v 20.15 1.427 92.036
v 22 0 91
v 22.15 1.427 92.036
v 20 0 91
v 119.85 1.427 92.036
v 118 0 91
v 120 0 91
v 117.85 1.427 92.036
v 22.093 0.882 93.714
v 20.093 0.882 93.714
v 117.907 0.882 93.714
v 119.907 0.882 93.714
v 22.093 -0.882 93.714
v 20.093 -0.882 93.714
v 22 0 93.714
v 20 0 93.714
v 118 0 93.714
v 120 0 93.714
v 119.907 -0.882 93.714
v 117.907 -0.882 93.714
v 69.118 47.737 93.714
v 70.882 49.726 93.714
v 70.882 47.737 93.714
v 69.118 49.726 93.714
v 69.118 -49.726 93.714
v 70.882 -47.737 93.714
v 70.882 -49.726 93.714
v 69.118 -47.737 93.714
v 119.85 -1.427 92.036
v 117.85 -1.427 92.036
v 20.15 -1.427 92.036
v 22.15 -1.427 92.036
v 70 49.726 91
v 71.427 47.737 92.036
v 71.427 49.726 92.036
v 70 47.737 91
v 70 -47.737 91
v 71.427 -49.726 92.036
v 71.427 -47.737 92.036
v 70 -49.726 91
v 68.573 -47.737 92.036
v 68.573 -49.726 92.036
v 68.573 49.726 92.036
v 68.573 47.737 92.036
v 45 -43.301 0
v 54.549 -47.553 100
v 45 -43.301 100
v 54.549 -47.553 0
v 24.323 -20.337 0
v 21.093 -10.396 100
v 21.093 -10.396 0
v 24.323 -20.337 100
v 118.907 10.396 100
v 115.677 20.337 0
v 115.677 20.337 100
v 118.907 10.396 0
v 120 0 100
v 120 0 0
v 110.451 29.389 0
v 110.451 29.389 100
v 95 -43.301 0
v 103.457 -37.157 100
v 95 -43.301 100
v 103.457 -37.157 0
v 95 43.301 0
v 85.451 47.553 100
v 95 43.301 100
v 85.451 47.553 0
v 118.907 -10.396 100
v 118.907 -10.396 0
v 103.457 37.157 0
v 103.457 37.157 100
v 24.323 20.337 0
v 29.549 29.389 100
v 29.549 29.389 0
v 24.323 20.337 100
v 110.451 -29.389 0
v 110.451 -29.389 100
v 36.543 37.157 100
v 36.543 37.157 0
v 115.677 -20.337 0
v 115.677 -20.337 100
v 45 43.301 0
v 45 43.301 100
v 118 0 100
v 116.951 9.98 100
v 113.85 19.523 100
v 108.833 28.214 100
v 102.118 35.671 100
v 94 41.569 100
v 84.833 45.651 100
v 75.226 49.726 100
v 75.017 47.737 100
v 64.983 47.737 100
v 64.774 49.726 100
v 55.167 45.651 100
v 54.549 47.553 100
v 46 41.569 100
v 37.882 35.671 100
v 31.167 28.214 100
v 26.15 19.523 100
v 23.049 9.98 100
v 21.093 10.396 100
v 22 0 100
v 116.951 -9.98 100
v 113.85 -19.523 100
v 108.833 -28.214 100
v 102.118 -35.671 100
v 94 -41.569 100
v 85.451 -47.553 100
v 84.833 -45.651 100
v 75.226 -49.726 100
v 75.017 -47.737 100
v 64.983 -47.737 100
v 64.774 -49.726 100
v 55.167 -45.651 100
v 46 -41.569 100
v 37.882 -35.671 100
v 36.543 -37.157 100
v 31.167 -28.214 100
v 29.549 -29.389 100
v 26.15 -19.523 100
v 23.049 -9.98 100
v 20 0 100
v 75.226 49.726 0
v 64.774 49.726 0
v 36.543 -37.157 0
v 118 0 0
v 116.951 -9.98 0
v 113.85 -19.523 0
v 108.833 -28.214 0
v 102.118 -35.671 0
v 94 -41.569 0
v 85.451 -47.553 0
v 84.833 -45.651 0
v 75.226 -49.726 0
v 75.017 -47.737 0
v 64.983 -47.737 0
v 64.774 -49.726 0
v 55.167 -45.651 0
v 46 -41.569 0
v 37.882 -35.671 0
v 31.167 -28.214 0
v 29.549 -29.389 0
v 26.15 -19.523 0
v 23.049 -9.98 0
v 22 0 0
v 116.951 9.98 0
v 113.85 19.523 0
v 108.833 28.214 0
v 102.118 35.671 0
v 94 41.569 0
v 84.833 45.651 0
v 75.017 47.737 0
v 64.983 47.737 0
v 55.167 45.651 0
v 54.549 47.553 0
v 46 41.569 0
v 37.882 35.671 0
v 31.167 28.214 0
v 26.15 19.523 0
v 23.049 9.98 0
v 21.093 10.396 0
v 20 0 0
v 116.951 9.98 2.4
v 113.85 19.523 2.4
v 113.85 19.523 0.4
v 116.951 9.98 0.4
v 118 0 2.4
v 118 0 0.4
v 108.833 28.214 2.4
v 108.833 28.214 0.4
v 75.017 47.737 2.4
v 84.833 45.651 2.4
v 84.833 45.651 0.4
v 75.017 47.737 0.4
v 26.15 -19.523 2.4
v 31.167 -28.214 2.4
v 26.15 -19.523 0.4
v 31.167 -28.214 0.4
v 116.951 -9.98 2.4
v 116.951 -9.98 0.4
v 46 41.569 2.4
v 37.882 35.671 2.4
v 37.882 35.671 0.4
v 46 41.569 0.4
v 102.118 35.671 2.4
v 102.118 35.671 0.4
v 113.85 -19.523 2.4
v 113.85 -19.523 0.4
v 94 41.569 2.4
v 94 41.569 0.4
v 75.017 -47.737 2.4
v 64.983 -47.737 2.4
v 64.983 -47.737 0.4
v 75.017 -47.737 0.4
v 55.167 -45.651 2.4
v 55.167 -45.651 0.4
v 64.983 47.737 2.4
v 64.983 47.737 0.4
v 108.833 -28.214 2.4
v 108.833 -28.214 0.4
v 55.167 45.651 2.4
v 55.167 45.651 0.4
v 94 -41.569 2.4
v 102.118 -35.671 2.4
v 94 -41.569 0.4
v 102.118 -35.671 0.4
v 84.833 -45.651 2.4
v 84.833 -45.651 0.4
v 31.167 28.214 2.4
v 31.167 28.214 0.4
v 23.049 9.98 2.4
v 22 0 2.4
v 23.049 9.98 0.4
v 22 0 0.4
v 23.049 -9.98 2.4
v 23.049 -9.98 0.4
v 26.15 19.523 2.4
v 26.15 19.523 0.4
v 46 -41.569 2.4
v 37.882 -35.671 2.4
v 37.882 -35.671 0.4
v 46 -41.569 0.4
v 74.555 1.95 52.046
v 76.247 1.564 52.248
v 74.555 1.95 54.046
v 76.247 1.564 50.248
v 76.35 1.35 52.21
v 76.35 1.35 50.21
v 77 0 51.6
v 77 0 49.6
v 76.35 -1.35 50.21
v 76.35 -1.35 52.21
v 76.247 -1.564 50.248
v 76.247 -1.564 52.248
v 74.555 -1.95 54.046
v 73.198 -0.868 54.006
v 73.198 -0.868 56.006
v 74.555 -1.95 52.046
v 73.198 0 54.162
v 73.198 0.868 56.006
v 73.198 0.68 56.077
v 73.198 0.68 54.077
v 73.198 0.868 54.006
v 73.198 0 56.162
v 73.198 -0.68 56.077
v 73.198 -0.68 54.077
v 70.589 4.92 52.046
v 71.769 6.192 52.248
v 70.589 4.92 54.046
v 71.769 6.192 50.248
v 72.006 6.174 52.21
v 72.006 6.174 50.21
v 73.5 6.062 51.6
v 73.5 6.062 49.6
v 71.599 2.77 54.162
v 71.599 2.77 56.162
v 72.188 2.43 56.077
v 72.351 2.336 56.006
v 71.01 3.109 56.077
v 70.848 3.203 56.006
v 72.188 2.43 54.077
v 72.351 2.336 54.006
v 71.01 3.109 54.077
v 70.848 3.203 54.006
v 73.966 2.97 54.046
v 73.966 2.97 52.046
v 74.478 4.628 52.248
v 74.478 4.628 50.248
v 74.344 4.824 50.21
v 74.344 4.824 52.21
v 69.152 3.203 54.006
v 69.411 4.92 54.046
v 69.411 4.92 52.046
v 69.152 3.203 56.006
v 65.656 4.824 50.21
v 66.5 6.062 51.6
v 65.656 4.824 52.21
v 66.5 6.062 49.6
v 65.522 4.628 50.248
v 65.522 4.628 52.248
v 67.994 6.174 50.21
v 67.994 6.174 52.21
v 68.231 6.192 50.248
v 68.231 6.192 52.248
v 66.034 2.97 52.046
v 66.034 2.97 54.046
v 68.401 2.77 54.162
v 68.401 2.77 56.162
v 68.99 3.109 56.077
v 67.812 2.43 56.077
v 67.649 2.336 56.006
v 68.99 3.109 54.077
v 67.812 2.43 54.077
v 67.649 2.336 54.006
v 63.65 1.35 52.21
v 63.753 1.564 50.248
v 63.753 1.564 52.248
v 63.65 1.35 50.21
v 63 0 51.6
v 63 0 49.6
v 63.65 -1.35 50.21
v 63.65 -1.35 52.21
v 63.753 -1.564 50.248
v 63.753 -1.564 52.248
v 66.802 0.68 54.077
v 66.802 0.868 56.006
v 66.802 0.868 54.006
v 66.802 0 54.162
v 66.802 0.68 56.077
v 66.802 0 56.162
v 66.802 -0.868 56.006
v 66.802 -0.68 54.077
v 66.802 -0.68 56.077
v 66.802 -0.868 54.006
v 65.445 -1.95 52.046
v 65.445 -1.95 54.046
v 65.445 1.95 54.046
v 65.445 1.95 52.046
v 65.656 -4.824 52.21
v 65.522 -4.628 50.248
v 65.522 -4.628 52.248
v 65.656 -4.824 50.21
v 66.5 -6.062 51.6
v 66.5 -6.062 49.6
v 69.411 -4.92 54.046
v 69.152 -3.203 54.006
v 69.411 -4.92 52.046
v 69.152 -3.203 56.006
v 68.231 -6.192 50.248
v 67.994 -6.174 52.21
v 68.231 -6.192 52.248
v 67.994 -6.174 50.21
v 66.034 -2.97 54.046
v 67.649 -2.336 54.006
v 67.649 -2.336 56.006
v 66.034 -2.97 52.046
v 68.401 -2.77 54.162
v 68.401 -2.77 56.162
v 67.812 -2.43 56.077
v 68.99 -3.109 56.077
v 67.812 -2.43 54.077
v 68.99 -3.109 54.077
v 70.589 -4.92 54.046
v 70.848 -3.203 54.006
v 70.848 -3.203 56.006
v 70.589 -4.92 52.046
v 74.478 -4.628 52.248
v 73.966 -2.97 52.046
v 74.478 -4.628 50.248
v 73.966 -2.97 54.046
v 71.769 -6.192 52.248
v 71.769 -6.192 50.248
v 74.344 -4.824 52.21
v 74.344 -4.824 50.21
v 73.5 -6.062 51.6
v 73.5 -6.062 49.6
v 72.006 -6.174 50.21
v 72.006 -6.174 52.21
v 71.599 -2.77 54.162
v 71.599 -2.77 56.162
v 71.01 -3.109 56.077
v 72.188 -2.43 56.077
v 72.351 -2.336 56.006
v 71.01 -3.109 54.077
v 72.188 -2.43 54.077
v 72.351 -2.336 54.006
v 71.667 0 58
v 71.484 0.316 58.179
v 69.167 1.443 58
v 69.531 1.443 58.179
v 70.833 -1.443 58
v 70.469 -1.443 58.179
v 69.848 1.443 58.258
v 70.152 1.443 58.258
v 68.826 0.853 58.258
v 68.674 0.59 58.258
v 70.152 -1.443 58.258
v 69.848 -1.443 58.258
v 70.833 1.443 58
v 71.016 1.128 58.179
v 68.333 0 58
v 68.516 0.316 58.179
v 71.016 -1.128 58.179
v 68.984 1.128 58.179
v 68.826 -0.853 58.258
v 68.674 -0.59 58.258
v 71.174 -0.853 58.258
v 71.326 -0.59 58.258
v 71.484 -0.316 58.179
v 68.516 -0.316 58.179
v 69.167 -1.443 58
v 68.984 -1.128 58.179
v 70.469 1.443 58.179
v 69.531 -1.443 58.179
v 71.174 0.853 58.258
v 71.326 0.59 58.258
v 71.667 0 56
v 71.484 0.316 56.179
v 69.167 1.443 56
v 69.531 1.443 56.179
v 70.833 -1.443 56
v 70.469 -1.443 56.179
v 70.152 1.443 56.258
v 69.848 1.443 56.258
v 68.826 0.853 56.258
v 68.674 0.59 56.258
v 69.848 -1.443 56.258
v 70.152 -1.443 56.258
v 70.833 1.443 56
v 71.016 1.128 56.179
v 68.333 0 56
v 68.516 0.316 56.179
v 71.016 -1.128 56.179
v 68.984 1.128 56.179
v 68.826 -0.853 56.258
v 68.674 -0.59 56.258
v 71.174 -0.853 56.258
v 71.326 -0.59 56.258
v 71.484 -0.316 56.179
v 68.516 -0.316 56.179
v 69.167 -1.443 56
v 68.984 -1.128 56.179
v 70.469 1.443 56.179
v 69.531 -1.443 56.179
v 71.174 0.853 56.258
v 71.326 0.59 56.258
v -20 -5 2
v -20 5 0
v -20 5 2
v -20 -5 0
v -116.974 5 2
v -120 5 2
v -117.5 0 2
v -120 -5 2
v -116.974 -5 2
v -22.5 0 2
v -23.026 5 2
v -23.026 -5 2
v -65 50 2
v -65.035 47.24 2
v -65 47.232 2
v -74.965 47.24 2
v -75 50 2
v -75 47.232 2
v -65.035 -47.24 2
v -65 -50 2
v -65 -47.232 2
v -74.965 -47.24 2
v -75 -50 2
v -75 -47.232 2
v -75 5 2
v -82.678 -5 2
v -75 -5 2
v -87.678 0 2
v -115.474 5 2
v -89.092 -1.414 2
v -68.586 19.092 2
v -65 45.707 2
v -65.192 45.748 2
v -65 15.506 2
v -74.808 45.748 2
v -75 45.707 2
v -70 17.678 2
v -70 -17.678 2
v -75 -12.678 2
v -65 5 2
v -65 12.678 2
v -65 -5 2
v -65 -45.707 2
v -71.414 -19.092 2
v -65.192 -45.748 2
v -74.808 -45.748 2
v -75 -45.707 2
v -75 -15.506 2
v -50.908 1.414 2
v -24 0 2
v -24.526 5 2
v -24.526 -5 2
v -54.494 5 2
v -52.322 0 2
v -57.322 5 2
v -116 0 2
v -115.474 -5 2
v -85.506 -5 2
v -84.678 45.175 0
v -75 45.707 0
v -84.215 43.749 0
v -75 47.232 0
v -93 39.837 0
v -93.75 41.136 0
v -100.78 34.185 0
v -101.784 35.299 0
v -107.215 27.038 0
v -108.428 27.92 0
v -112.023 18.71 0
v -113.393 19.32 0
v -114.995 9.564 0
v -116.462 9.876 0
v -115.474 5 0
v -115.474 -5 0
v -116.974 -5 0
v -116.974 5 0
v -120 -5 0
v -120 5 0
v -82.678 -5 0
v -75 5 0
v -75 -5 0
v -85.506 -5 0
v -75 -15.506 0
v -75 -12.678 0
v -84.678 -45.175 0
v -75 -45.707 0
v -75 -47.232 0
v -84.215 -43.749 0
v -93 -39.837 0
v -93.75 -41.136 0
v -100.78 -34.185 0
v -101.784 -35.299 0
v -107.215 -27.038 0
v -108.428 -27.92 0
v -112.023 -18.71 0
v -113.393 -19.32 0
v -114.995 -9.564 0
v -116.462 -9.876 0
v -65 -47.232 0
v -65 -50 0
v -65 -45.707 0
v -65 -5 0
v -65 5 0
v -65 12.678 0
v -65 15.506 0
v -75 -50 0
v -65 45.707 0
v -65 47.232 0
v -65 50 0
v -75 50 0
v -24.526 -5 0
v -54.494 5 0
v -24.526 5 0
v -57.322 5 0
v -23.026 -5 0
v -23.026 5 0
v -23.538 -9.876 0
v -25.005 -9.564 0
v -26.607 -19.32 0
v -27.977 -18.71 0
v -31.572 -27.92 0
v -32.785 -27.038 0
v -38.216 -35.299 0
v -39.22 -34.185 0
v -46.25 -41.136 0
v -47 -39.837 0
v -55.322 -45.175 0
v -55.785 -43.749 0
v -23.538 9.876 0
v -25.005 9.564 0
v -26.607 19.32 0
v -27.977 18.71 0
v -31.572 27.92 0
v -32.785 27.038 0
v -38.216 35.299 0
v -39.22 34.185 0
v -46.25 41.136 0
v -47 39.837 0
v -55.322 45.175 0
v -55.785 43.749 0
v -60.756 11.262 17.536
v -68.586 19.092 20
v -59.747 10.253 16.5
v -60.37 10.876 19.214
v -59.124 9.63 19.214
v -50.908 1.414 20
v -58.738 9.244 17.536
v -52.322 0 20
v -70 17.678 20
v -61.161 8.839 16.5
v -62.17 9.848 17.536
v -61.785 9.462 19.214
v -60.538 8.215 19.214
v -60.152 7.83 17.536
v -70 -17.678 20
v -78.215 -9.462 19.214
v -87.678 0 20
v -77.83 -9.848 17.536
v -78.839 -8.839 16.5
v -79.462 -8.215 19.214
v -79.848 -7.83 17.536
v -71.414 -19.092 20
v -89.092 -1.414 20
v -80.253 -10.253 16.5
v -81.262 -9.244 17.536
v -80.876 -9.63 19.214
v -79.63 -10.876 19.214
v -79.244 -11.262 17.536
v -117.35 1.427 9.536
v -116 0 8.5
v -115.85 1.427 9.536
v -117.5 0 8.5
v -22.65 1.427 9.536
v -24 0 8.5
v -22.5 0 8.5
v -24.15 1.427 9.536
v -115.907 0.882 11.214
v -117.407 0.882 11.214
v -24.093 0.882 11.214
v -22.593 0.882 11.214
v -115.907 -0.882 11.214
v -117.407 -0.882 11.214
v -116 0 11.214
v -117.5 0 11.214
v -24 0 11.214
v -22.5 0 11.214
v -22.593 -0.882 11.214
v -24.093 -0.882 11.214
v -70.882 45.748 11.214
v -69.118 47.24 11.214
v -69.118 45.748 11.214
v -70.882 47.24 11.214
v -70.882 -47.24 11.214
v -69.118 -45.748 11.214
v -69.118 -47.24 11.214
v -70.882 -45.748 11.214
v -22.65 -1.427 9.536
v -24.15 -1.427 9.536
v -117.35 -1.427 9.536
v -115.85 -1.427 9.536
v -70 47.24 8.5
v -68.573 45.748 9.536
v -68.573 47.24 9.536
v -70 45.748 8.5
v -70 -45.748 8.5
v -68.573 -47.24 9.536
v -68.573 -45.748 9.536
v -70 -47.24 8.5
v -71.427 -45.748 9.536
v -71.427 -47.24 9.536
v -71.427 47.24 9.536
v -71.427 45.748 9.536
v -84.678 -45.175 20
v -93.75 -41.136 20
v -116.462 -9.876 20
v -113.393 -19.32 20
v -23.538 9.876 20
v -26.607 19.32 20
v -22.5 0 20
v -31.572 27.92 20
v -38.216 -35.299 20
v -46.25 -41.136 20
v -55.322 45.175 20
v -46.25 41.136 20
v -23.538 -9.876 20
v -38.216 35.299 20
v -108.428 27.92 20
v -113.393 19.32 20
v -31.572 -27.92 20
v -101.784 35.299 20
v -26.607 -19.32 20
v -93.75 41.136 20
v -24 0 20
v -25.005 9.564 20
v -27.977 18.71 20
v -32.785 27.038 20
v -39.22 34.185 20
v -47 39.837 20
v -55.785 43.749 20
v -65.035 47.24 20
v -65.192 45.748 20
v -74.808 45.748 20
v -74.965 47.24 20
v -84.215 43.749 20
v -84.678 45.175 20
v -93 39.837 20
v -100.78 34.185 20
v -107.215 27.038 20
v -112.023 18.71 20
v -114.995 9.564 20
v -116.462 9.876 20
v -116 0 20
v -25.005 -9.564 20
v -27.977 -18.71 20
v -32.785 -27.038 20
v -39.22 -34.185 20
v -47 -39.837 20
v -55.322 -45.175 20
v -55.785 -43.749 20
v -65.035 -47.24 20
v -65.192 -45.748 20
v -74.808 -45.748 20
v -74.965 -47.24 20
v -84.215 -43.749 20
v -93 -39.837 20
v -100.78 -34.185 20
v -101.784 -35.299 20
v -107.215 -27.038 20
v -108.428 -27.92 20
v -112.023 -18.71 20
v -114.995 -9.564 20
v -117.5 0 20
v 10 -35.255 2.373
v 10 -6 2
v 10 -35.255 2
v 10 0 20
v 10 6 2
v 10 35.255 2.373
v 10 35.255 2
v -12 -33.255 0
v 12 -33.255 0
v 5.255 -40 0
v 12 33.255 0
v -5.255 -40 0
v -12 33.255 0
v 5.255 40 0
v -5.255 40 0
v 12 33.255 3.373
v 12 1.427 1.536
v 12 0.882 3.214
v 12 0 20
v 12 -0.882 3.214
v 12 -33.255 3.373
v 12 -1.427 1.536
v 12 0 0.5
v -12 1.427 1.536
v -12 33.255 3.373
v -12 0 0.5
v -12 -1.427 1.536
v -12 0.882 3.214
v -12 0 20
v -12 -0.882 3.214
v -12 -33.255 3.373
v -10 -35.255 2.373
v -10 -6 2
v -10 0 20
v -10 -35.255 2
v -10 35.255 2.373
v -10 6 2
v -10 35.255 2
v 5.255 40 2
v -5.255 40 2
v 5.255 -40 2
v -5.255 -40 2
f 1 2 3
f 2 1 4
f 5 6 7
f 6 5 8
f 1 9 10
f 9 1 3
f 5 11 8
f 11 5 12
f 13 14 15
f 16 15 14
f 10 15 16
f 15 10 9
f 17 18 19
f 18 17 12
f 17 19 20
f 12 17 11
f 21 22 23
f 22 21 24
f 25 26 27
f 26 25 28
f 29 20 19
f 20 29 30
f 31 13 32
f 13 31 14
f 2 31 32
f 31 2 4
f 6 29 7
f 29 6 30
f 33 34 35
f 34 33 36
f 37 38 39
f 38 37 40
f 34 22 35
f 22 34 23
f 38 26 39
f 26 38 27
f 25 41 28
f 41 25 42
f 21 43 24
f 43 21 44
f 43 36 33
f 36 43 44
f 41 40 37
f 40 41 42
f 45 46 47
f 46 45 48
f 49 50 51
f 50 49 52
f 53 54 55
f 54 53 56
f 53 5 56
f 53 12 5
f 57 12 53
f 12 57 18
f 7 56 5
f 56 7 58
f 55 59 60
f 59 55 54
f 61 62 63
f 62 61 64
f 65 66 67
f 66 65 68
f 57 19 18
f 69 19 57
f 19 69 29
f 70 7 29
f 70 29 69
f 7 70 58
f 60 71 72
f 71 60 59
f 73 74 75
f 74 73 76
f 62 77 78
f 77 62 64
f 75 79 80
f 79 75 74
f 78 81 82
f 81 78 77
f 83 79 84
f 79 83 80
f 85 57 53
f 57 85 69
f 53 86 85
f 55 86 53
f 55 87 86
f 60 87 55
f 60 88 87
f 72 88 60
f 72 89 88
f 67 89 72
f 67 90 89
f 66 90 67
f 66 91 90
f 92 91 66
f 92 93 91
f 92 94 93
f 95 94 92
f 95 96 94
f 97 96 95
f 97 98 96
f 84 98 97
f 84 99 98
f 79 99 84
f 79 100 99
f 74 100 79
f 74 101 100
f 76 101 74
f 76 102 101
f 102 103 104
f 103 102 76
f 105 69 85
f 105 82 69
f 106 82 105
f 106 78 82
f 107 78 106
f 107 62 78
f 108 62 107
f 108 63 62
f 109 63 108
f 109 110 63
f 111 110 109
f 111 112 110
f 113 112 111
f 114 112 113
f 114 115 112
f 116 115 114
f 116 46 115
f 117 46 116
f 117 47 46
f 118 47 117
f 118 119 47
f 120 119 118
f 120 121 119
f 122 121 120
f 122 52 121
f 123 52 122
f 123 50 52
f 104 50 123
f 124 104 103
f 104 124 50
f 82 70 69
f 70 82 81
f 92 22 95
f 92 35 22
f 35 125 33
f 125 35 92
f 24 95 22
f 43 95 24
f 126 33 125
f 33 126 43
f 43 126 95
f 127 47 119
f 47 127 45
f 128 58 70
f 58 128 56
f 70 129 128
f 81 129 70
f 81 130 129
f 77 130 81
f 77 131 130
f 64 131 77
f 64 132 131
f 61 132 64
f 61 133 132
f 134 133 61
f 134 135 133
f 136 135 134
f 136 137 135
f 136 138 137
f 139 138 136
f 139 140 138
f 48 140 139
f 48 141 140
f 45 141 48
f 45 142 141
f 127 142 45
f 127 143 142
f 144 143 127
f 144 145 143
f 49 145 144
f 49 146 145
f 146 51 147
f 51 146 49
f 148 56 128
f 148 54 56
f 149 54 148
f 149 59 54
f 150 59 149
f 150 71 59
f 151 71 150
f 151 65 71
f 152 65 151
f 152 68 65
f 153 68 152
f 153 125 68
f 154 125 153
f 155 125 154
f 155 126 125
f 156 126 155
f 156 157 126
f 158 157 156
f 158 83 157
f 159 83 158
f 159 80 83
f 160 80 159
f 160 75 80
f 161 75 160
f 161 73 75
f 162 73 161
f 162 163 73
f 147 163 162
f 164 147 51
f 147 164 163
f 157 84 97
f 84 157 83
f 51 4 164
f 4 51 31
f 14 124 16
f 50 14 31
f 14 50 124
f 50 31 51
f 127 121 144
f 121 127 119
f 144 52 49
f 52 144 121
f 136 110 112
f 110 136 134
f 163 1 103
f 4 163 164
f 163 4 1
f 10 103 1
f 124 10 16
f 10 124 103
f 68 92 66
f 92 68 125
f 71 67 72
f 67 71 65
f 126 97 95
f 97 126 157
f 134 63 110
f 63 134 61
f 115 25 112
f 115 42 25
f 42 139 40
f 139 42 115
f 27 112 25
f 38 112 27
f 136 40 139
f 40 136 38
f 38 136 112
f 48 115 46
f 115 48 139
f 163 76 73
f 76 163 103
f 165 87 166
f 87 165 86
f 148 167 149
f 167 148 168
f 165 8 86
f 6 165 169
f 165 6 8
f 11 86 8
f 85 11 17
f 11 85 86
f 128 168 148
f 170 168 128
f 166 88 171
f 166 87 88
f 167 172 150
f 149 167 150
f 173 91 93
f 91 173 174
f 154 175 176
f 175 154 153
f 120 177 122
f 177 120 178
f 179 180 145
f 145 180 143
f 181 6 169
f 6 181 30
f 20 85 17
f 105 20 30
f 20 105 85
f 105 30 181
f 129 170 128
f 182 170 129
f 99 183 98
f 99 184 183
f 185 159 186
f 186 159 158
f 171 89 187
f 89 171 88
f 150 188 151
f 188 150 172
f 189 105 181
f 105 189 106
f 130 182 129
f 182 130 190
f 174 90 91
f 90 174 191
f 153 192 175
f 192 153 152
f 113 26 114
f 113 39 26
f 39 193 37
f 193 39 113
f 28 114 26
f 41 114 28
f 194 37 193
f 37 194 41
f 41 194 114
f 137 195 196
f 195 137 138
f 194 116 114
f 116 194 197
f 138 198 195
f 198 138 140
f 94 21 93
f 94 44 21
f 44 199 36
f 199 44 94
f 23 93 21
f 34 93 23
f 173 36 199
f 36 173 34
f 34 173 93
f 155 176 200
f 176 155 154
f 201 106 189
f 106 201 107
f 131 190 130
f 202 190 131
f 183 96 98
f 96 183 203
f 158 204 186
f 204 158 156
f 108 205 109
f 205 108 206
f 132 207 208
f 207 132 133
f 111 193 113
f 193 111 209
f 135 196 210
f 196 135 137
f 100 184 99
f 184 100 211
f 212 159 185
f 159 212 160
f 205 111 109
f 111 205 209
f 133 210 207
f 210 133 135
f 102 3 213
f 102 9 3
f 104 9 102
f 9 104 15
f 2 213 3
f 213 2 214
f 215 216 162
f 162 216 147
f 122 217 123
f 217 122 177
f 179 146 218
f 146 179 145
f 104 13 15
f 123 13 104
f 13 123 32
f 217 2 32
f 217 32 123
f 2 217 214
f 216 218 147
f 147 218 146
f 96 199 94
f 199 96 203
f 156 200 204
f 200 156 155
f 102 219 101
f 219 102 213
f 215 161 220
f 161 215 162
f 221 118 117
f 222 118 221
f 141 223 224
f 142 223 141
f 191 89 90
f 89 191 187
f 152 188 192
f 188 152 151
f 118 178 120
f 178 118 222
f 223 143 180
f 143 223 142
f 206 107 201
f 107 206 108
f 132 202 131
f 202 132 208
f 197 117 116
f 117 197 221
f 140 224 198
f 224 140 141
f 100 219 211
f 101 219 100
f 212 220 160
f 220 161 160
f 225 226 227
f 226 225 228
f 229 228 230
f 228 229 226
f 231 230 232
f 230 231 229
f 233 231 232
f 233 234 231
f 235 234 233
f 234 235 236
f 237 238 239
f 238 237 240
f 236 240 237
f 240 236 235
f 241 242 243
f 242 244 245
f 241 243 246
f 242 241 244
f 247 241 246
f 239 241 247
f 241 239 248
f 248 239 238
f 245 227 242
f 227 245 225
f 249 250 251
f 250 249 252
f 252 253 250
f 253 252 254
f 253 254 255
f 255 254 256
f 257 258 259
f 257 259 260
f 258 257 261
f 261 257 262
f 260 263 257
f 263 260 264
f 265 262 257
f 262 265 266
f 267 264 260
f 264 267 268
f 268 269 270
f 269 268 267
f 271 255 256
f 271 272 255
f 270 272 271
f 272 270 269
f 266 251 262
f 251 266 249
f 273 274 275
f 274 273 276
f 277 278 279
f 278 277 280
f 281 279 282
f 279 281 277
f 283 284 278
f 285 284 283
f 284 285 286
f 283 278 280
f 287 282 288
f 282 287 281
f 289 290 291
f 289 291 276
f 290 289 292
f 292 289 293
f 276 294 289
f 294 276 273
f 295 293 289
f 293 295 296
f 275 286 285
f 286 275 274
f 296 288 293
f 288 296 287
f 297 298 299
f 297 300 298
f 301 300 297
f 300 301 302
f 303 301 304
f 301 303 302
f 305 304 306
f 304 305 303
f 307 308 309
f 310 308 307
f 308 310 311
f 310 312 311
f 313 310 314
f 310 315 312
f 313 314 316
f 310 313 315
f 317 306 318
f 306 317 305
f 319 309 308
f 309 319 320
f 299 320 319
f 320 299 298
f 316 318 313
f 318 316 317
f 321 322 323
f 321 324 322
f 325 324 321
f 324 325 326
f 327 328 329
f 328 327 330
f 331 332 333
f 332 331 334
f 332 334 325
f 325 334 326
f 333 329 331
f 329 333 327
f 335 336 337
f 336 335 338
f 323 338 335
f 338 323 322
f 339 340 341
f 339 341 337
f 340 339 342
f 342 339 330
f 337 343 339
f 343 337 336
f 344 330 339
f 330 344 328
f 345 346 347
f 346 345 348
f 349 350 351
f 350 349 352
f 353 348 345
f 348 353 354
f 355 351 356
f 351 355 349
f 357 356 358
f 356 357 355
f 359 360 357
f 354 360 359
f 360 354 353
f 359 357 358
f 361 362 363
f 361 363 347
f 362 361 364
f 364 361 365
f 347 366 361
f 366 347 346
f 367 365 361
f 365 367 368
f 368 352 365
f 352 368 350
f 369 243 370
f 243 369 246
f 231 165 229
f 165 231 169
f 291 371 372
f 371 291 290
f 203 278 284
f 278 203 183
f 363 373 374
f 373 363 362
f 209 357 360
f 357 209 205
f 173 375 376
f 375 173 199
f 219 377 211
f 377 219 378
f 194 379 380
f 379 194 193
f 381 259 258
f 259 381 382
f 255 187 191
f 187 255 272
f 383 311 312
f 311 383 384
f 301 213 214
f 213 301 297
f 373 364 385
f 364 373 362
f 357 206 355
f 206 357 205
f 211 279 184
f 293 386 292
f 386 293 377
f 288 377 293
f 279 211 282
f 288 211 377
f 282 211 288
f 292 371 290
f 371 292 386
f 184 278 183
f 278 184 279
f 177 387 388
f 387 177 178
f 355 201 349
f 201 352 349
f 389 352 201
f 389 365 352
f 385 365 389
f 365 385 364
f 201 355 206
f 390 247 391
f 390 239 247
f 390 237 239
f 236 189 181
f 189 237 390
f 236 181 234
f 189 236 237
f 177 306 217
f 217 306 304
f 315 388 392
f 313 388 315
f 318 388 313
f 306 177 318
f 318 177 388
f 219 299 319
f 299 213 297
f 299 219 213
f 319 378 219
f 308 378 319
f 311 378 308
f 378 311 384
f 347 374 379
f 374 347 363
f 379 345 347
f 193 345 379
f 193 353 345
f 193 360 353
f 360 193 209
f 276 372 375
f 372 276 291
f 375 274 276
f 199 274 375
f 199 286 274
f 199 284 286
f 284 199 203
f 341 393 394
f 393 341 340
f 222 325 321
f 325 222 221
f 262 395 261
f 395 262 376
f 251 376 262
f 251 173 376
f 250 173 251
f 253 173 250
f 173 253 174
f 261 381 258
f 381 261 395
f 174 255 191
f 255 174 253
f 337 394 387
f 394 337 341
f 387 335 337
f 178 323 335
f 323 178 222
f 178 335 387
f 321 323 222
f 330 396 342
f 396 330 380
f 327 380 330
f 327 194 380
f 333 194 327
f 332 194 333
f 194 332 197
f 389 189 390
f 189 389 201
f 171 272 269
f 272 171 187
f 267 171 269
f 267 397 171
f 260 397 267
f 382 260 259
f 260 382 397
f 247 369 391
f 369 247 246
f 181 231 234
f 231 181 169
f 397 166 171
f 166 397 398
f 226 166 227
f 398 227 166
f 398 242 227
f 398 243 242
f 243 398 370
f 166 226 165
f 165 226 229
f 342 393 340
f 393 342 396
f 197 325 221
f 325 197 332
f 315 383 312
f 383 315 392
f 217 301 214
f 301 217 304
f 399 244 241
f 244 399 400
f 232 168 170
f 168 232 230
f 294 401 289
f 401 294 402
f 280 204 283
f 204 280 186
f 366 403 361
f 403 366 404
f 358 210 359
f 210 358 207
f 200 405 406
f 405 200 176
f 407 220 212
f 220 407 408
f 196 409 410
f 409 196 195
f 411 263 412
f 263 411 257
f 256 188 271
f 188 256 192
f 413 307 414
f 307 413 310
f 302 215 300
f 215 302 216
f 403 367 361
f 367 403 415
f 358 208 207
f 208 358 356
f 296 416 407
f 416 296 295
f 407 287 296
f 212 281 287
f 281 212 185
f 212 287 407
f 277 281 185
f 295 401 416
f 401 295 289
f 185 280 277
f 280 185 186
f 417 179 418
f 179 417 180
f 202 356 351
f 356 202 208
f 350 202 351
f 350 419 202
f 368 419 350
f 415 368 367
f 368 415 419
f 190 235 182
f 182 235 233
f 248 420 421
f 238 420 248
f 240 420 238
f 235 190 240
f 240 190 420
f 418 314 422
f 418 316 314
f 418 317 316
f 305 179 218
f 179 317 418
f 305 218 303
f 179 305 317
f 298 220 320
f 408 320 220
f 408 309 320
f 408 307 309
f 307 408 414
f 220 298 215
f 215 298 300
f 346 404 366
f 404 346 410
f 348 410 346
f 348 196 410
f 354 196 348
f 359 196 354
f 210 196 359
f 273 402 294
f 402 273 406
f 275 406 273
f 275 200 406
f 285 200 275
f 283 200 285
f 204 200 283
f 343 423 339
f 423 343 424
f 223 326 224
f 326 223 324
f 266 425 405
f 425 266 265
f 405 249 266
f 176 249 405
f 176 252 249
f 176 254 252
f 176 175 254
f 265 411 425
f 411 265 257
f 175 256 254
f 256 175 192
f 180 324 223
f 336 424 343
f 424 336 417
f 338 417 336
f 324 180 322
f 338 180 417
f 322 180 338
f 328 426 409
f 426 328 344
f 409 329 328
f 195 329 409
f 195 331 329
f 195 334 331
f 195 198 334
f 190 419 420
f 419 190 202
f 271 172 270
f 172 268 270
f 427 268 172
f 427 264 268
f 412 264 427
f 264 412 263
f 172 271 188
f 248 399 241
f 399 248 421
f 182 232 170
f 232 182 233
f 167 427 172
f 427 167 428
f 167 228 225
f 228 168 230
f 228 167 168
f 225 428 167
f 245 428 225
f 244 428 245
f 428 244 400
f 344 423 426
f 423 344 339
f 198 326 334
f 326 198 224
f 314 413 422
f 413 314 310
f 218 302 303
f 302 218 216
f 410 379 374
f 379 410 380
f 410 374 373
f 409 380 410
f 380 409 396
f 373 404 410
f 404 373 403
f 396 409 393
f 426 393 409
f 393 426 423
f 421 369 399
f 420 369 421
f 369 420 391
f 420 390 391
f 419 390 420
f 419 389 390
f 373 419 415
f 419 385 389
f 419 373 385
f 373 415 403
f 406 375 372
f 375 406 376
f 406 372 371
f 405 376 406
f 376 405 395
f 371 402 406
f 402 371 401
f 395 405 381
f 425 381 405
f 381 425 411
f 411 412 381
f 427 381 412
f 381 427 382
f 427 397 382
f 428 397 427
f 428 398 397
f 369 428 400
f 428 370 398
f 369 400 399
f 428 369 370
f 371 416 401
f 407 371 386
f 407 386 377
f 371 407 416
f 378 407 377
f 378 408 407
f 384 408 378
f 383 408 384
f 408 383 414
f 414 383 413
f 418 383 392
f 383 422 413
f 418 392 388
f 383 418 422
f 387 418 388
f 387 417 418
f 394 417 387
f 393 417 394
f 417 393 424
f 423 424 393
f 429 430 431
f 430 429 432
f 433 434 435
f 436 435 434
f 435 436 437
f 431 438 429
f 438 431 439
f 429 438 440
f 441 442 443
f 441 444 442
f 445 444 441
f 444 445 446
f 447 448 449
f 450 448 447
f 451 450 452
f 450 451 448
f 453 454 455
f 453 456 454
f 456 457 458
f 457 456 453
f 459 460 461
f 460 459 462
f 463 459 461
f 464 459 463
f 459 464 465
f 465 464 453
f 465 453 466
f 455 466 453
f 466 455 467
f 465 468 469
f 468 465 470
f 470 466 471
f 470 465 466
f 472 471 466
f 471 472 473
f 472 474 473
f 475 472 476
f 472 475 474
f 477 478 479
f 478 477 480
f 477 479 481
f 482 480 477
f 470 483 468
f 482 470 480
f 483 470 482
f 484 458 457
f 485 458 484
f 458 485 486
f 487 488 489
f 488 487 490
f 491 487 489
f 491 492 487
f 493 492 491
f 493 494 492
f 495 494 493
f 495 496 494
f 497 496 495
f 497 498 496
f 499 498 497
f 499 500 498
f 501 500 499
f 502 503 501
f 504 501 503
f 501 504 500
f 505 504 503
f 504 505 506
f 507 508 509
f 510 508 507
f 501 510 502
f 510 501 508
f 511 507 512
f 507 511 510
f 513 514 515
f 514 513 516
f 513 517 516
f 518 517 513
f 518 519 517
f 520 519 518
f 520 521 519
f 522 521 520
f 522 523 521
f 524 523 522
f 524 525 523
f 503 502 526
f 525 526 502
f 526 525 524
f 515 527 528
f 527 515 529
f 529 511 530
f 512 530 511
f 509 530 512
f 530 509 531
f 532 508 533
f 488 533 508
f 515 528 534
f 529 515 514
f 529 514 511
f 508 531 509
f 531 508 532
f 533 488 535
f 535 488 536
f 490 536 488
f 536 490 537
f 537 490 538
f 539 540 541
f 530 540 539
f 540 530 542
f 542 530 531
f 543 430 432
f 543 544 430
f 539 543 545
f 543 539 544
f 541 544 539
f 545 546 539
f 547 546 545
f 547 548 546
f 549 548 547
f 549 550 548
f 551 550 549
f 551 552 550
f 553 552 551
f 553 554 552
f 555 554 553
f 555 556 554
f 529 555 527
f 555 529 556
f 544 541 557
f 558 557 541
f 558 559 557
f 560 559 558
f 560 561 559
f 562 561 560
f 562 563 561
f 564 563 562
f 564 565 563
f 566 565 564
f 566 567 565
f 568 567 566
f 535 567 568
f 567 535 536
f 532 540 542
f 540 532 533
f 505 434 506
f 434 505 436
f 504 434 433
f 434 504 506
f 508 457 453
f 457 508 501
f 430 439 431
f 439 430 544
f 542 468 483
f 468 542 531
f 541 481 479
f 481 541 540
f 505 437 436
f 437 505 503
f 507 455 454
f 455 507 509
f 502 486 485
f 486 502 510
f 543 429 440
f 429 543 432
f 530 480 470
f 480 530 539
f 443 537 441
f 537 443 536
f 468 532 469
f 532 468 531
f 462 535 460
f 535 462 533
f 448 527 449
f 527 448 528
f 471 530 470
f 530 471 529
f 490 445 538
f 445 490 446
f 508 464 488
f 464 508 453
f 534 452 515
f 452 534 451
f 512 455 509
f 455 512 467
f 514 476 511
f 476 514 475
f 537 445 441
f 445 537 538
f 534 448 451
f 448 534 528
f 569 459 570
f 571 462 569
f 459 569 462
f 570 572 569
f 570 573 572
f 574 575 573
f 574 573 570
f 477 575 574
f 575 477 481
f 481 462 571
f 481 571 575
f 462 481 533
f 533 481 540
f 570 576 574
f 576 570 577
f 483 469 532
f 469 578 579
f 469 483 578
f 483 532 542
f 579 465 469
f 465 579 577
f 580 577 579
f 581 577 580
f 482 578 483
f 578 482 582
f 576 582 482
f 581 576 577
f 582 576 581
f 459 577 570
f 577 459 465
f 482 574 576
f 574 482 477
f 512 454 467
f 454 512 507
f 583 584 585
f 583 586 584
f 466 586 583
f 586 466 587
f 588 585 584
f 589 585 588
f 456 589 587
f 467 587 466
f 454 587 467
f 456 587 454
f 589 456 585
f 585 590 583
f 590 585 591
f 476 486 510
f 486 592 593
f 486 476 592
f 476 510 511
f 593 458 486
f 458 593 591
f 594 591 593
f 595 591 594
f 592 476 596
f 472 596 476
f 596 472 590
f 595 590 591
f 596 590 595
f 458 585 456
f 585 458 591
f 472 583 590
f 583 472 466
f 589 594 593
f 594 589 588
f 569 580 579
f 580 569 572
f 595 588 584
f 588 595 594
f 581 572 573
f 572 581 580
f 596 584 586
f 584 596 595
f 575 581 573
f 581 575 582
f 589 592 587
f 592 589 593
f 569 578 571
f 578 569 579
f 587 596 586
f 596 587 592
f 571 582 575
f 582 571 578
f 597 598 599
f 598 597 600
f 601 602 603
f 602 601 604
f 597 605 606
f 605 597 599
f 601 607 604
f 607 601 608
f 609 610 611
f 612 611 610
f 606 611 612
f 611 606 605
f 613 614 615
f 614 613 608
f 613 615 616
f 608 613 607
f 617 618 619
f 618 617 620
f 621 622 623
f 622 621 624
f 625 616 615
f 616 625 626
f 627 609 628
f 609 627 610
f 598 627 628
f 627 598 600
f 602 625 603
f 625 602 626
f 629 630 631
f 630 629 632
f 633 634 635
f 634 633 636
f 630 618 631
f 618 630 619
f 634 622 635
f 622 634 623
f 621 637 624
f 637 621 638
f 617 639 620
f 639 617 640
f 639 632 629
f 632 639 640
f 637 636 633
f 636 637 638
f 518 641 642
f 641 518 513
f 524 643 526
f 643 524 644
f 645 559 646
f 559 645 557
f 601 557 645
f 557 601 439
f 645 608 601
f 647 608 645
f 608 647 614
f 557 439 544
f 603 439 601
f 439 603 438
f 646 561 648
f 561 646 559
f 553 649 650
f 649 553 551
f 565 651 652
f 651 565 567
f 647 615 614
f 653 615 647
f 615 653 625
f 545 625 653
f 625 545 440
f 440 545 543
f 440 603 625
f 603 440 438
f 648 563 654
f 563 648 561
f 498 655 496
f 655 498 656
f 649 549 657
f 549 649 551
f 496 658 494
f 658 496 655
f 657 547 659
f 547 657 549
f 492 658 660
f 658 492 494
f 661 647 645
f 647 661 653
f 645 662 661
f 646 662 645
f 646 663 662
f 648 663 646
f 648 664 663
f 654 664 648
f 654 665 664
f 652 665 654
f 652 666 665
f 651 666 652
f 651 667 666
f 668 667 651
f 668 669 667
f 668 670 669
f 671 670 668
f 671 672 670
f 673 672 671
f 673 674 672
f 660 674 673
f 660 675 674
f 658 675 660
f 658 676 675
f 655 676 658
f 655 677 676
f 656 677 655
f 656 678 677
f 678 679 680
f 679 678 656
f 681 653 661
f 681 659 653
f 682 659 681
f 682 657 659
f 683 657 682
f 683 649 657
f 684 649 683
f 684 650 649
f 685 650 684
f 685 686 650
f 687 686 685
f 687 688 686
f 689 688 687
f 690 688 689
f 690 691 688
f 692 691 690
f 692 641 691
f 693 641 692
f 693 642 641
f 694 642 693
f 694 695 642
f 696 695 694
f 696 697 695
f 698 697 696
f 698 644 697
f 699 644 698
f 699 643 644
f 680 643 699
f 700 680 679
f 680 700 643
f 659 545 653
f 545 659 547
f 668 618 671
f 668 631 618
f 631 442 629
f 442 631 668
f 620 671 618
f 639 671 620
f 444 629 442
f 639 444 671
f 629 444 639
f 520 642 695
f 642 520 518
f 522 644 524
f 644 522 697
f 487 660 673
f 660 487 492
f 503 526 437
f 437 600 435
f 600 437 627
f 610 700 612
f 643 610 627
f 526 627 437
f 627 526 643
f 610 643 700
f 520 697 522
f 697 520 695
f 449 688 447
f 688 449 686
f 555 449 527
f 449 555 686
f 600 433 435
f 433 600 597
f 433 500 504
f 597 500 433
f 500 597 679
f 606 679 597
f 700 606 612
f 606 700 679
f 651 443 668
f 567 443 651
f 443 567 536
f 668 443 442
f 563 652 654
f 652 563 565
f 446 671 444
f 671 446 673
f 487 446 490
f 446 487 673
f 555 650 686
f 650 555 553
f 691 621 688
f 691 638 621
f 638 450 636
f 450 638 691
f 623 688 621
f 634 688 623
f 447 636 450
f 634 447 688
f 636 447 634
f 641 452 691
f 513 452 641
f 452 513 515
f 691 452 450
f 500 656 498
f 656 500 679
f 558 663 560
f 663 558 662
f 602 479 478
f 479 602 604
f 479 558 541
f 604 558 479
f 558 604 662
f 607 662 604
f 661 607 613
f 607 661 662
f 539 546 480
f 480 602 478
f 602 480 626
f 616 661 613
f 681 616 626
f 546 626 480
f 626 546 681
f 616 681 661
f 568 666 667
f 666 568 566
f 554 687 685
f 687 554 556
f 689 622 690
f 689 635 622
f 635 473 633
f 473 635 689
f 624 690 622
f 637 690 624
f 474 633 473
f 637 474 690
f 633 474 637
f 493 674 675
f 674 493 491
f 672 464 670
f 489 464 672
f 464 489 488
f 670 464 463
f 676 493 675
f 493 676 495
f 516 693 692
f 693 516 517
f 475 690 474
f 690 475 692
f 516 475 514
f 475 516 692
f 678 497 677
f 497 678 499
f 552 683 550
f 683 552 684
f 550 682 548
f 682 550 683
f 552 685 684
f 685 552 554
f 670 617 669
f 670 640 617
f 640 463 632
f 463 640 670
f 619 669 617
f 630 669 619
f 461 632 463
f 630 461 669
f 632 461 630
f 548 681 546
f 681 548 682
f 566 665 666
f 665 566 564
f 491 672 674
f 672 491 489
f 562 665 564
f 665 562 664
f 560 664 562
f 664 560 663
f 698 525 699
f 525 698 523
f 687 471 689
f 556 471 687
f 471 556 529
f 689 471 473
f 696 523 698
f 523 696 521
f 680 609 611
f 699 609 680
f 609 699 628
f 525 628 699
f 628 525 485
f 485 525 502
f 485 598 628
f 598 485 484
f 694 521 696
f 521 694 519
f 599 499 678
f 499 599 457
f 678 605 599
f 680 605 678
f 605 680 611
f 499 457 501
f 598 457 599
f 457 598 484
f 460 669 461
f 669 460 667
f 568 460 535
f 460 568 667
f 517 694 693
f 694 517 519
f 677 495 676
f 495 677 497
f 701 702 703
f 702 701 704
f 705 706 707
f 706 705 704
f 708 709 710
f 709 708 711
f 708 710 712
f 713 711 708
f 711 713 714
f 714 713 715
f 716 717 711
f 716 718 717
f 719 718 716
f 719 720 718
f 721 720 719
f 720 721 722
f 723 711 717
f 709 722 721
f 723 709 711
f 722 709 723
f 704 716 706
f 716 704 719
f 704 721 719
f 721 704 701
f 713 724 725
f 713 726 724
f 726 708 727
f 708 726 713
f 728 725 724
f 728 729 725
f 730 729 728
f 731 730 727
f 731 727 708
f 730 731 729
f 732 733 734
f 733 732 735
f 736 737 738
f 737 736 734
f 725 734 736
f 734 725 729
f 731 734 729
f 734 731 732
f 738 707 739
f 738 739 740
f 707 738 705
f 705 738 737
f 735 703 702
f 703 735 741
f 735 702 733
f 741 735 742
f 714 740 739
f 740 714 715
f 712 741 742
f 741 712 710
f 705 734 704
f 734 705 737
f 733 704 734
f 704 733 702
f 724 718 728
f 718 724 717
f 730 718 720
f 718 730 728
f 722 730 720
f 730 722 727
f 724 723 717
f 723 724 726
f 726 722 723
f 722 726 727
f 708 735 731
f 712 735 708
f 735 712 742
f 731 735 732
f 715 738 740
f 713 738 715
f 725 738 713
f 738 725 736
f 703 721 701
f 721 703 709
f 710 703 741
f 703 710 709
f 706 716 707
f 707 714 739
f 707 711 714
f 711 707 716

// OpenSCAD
// All sizes are in mm
diameter = 100;
funnelheight = diameter*0.6;
assemblyheight = diameter;

clapperheight = 0.5*(assemblyheight-funnelheight);
clapperwidth = 0.6*(assemblyheight-funnelheight);
clapperlength = 0.8*diameter;
minordiameter = diameter/10;
thick = 2;
fudge = 0.5;

// set below to true for print layout, something else for assembly
printing = true;

square_centimeters =  diameter * diameter / 4 * 3.1415926 / 100;

echo( "Funnel surface = ",square_centimeters,"cm²");
echo( "Adding 100 milliliter of water is thus ", 1000 / square_centimeters, "mm precipitation");


if( printing )
{
	translate([.7*diameter,0,0])
		funnel();
	translate([-.7*diameter,0,0])
		base();
	clapper();
}
else
{
	color([1,1,0])
			base();
	color([1,0,1])
	difference() {
		translate([0,0,assemblyheight+thick])
		rotate([180,0,0])
			funnel();
		translate([thick, thick, 2*thick])
			cube([diameter, diameter, diameter]);
	}
	color([0,1,1])
	translate([0,0,clapperheight-2])
	rotate([30,0,45])
	translate([0,0,-2])
		clapper();
}

module funnel()
{
	union() {
		// Side walls
		difference() {
			cylinder(r=diameter/2, h=assemblyheight);
			translate([0,0,-thick])
			 	cylinder(r=diameter/2-thick, h=assemblyheight+2*thick);
			// mounting holes
			translate([0,0, assemblyheight-4*thick+fudge])
			{
				rotate([0,90,0])
						cylinder(r=1.5,h=diameter,center=true);
				rotate([90,90,0])
						cylinder(r=1.5,h=diameter,center=true);
			}
		}
		// Funnel
		difference() {
			cylinder(r1=diameter/2, r2=0, h=funnelheight);
			translate([0,0,-thick*1.0])
				cylinder(r1=diameter/2, r2=0, h=funnelheight);
			cylinder(r=minordiameter/6, h=assemblyheight);
			// Funnel holes
			for(i=[0:60:360])
				rotate([0,0,i])
				translate([minordiameter/2,0,0])
					cylinder(r=minordiameter/5, h=assemblyheight);
			
		}

	}
}


module base()
{	
	union() {
		// Cross base
		translate([0,0,thick/2])
		{
			cube([diameter,minordiameter,thick], center=true);
			cube([minordiameter,diameter,thick], center=true);
		}
		// Clapper mounting
		rotate([0,0,45])
		{
			difference()
			{	
				union() 
				{
					translate([clapperwidth/2+fudge,-diameter/8])
						cube([thick, diameter/4,clapperheight]);	
					translate([-clapperwidth/2-fudge-thick,-diameter/8])
						cube([thick, diameter/4,clapperheight]);
				}	
				translate([0,0,clapperheight-2])
					rotate([0,90,0])
						cylinder(r=1.5,h=diameter,center=true);
			}
		}
		// Funnel mounting 
		difference() {
			cylinder(r=diameter/2-thick-fudge, h=clapperheight);
			translate([0,0,-thick])
			 	cylinder(r=diameter/2-thick*2, h=clapperheight+2*thick);
			translate([0,0,5*thick])
			{
				rotate([0,90,0])
						cylinder(r=1.5,h=diameter,center=true);
				rotate([90,90,0])
						cylinder(r=1.5,h=diameter,center=true);
			}
		}
	}
}


module clapper()
{
	intersection()
	{
		difference()
		{
			translate([-clapperwidth/2,0,0]) 
			{
				union() 
				{
					//Sides
					translate([clapperwidth-thick,0,0])
					{
						vertTriangle(clapperlength,clapperheight,thick);
					} 
					vertTriangle(clapperlength,clapperheight,thick);
					//Base
					translate([0,-clapperlength/2,0])
						cube([clapperwidth,clapperlength,thick]);
					//Center
					vertTriangle(clapperlength/6,clapperheight,clapperwidth);
				}
			}
			// Mounting hole
			translate([0,0,2])
				rotate([0,90,0])
					cylinder(r=1.5,h=diameter,center=true);
		}
		// Taper ends
		rotate([0,0,45])
			scale(0.8)
			cube([clapperlength,clapperlength,clapperlength], center=true);
	}
}

module vertTriangle(base,height,thick)
{
	rotate([90,00,90])
	linear_extrude(height=thick)
	{
		polygon(points=[[-base/2,0],[base/2,0],[0,height]], paths=[[0,1,2]]);
	}
}
